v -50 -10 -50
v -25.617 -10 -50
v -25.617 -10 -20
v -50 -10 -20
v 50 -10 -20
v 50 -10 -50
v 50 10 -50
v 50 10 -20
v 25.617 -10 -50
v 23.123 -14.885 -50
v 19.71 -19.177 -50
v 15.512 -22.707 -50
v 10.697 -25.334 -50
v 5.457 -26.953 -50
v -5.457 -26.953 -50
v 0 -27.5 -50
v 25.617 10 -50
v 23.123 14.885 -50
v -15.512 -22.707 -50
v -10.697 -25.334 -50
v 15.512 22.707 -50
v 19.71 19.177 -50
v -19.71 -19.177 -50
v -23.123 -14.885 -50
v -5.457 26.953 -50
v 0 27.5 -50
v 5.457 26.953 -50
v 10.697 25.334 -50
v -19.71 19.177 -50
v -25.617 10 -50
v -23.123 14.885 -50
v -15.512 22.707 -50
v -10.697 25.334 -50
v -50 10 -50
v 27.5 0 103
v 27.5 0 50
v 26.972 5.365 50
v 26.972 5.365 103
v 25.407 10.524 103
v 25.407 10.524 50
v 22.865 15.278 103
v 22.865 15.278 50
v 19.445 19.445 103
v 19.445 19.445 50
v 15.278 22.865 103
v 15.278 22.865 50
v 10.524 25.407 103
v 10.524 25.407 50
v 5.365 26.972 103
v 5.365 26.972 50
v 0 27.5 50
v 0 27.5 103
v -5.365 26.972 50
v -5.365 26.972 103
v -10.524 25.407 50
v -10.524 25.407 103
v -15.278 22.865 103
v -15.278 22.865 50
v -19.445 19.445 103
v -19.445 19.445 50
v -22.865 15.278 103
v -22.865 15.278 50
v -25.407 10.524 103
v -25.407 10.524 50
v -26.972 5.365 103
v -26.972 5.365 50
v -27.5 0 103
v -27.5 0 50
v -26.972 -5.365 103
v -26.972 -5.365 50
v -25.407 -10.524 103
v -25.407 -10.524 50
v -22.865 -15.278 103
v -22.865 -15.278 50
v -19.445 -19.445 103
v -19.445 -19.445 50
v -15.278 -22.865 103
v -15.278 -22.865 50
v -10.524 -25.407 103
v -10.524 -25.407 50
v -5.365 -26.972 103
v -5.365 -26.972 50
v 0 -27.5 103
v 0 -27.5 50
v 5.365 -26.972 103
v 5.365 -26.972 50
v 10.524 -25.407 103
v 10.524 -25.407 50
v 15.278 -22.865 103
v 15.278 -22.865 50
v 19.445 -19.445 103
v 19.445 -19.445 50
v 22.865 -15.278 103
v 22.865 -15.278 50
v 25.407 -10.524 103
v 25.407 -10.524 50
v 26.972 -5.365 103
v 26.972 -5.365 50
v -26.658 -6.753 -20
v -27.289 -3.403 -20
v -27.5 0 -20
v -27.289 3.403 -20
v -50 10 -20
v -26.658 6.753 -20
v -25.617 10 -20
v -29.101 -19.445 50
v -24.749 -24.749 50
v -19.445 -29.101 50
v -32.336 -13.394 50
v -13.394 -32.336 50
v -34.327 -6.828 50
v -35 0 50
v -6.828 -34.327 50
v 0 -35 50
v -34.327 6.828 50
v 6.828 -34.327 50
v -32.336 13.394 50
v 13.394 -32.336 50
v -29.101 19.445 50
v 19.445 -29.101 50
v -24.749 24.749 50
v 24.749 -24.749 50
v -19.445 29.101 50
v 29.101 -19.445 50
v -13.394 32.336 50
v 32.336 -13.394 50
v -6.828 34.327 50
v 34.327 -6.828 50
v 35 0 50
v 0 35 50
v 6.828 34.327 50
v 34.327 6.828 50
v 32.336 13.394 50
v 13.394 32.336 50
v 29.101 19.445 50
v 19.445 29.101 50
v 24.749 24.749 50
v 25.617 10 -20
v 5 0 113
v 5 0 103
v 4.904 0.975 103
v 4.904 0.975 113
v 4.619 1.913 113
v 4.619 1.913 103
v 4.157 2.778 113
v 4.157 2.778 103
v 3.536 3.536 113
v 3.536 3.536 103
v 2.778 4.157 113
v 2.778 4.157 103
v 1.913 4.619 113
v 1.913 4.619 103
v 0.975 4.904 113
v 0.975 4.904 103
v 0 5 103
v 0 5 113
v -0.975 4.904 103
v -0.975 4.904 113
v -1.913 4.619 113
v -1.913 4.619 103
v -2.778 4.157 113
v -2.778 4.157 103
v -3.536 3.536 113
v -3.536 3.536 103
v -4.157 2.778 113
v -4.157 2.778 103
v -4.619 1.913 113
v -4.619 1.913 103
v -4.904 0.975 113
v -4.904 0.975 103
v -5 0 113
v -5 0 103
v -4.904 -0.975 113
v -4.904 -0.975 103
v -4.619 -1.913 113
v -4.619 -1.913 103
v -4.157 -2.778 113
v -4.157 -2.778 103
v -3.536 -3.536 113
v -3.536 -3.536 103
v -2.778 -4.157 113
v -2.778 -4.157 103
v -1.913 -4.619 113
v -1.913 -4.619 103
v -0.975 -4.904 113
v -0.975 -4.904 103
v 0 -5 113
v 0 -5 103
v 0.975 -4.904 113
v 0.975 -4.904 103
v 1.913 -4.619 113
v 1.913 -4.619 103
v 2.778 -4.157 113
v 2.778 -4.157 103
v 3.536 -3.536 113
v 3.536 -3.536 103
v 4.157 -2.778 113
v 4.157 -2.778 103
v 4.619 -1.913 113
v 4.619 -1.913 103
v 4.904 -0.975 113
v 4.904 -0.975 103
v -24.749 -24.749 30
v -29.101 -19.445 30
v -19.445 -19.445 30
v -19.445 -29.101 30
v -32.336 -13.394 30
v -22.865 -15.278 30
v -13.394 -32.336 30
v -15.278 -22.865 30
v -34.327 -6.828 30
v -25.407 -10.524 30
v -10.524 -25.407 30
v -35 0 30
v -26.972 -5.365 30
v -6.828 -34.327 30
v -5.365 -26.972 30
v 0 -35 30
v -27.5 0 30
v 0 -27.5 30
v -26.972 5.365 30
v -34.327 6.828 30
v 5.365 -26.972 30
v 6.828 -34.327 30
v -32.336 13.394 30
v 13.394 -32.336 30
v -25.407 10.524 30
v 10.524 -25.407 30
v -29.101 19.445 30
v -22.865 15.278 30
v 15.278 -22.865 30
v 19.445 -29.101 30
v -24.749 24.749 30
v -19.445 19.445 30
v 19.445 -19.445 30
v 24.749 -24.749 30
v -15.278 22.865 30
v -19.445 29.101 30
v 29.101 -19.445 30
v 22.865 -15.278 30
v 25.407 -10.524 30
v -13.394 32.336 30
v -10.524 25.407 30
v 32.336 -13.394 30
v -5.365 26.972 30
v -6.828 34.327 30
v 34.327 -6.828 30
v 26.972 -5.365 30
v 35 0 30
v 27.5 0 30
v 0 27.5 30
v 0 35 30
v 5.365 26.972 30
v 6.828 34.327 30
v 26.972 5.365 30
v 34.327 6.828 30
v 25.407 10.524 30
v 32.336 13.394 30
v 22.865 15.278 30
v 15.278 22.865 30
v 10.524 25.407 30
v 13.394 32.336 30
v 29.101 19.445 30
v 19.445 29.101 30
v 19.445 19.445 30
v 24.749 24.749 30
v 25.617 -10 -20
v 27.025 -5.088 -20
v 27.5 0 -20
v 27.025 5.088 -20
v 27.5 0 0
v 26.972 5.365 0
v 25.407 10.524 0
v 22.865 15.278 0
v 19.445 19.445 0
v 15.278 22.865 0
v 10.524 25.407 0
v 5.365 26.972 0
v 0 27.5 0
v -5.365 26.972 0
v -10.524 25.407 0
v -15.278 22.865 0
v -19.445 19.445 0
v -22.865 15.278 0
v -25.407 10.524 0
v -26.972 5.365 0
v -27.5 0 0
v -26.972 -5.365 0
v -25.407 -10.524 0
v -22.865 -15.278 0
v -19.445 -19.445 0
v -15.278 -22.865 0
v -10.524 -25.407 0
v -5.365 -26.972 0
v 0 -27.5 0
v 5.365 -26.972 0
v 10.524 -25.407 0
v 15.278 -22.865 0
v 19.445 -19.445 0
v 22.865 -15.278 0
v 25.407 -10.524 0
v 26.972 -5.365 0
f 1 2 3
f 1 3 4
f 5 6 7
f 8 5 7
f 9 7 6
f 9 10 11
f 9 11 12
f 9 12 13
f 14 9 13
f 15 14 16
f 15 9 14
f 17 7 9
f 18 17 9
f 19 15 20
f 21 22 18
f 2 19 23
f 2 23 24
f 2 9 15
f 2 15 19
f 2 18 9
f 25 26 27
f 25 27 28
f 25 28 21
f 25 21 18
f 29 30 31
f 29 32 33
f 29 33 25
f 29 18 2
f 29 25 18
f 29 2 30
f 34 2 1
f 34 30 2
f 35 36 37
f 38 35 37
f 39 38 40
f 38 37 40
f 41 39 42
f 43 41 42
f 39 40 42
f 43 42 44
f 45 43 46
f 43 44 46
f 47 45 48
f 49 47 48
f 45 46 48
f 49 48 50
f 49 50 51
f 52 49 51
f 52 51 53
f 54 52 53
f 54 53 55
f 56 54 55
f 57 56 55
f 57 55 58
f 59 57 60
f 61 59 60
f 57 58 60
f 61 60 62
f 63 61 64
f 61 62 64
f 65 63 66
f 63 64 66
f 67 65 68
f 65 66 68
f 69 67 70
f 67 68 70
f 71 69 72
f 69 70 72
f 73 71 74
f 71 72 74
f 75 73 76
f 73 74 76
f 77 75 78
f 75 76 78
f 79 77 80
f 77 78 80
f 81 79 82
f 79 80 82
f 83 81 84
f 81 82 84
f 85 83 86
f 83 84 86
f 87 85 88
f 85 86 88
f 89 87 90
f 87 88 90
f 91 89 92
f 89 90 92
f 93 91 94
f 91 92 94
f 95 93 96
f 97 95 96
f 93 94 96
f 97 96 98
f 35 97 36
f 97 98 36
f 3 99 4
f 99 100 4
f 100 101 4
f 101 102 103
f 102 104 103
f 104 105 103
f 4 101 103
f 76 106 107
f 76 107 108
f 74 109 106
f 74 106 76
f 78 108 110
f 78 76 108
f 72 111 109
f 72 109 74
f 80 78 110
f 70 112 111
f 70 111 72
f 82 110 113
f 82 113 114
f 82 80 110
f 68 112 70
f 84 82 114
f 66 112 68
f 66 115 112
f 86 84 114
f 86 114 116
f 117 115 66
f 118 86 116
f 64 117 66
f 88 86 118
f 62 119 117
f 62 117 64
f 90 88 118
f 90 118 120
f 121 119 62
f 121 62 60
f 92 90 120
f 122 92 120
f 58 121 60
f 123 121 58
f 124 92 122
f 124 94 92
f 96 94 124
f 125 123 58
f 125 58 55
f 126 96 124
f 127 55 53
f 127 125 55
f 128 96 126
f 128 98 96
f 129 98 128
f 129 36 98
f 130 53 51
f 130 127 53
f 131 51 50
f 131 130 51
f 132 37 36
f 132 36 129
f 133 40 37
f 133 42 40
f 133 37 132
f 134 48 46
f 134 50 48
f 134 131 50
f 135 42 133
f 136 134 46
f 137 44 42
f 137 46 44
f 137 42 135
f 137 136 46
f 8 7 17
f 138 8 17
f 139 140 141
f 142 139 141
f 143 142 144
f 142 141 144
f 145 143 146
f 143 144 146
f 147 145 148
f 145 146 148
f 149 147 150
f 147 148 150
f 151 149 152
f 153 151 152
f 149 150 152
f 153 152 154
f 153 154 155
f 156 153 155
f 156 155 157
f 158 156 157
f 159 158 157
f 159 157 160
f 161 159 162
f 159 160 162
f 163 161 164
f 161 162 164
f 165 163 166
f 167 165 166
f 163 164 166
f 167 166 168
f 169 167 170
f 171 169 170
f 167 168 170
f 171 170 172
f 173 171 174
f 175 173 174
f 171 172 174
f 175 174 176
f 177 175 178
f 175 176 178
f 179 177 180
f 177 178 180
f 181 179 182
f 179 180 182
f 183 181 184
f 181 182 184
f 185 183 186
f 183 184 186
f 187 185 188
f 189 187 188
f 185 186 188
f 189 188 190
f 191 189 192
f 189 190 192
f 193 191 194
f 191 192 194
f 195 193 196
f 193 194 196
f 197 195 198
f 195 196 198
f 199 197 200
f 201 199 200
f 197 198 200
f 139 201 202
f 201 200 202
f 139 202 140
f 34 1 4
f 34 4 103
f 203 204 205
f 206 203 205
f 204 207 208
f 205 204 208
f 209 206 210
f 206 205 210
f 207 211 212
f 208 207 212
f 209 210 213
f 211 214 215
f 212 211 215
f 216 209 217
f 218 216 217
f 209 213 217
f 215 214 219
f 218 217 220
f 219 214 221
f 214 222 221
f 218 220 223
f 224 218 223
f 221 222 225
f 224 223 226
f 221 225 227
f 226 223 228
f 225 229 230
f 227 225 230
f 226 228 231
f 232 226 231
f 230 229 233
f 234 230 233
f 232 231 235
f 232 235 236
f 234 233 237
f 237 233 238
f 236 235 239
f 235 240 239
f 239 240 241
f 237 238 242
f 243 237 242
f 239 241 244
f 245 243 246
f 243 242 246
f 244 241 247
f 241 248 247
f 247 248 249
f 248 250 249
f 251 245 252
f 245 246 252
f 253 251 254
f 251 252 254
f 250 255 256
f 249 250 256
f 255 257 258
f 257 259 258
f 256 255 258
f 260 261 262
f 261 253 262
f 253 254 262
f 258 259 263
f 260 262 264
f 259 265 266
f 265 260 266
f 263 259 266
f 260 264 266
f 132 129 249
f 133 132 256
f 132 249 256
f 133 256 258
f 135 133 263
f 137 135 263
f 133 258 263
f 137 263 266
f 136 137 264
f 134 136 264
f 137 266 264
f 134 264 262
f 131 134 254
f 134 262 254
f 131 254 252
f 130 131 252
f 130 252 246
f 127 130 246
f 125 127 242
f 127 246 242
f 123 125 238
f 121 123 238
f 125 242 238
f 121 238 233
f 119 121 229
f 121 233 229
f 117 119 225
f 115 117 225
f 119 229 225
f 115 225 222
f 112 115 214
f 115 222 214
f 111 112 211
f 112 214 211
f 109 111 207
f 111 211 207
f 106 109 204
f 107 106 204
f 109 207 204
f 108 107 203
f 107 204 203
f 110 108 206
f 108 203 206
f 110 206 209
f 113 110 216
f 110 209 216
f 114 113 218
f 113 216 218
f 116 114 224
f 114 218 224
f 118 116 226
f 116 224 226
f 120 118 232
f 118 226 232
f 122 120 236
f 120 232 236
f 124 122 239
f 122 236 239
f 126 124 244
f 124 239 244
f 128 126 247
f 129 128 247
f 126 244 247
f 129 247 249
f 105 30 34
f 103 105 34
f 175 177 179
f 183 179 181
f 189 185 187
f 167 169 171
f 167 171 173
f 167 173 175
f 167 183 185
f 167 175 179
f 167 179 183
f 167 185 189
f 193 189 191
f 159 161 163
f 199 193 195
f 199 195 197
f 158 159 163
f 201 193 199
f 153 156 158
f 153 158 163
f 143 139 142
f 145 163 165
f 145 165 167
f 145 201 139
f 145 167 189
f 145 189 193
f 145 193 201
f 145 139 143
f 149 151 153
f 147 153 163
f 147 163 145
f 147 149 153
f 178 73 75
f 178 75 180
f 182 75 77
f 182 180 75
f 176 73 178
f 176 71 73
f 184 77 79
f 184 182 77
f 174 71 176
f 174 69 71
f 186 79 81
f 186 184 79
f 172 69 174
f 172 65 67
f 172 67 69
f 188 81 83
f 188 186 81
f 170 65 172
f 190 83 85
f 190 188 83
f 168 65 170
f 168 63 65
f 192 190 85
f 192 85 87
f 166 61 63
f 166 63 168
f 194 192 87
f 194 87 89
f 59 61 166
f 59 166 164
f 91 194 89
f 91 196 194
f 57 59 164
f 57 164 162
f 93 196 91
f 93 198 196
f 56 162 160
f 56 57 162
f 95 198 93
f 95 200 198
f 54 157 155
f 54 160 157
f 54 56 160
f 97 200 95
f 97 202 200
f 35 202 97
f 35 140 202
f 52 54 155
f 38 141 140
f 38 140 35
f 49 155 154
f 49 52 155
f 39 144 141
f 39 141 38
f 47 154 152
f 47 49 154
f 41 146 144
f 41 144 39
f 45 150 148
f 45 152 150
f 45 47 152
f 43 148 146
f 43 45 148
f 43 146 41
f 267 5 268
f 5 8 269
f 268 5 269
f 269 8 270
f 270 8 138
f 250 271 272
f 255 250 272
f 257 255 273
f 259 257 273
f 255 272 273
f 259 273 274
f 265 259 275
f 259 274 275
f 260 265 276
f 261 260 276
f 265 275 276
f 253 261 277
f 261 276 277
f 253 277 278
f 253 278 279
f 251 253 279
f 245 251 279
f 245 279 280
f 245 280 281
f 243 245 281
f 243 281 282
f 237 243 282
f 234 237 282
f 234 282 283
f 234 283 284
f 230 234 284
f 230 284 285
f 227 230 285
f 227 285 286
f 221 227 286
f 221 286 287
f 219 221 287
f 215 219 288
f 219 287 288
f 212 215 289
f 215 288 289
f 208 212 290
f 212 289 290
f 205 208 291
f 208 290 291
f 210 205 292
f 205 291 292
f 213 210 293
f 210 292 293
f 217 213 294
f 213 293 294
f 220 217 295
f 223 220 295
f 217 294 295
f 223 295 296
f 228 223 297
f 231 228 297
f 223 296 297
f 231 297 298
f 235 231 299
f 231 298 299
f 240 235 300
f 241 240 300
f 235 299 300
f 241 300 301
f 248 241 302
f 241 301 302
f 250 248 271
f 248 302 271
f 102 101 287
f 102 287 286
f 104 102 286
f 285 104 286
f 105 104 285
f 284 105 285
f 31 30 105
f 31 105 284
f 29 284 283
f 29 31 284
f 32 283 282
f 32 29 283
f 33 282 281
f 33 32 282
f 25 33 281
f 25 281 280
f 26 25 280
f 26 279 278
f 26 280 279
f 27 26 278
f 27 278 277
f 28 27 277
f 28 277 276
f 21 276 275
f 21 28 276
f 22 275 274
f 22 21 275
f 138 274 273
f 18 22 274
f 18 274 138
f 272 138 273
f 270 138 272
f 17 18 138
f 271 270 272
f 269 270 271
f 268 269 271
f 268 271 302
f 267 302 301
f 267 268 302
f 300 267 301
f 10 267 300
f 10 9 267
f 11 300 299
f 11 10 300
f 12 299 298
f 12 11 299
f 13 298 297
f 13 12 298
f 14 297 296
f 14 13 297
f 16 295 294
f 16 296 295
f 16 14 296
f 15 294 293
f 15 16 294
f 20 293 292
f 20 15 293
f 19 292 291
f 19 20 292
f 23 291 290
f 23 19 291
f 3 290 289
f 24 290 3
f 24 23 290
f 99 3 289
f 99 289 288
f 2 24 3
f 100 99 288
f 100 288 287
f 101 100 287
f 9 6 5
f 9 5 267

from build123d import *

# Parameters (mm, degrees)
SKETCH1_R           = 27.5
BOSS_EXTRUDE1_DEPTH = 30
SKETCH2_R           = 35
BOSS_EXTRUDE2_DEPTH = 20
SKETCH3_R           = 27.5
BOSS_EXTRUDE3_DEPTH = 53
SKETCH4_R           = 5
BOSS_EXTRUDE4_DEPTH = 10
BOSS_EXTRUDE5_START = 50
SKETCH5_R           = 27.5
BOSS_EXTRUDE5_DEPTH = 50
SKETCH8_W           = 100
SKETCH8_H           = 20
BOSS_EXTRUDE6_DEPTH = 30


with BuildPart() as part:
    # Sketch1 → Boss-Extrude1 (new body)
    with BuildSketch(Plane.XY):
        Circle(SKETCH1_R)
    extrude(amount=BOSS_EXTRUDE1_DEPTH)

    # Sketch2 → Boss-Extrude2 (add)
    with BuildSketch(Plane.XY.offset(30)):
        Circle(SKETCH2_R)
    extrude(amount=BOSS_EXTRUDE2_DEPTH)

    # Sketch3 → Boss-Extrude3 (add)
    with BuildSketch(Plane.XY.offset(50)):
        Circle(SKETCH3_R)
    extrude(amount=BOSS_EXTRUDE3_DEPTH)

    # Sketch4 → Boss-Extrude4 (add)
    with BuildSketch(Plane.XY.offset(103)):
        Circle(SKETCH4_R)
    extrude(amount=BOSS_EXTRUDE4_DEPTH)

    # Sketch5 → Boss-Extrude5 (add)
    with BuildSketch(Plane(origin=(0, 0, 0), x_dir=(-1, 0, 0), z_dir=(0, 0, -1)).offset(BOSS_EXTRUDE5_START)):
        Circle(SKETCH5_R)
    extrude(amount=-BOSS_EXTRUDE5_DEPTH)

    # Sketch8 → Boss-Extrude6 (add)
    with BuildSketch(Plane(origin=(0, 0, -50), x_dir=(-1, 0, 0), z_dir=(0, 0, -1))):
        Rectangle(SKETCH8_W, SKETCH8_H)
    extrude(amount=-BOSS_EXTRUDE6_DEPTH)


solid = part.part
